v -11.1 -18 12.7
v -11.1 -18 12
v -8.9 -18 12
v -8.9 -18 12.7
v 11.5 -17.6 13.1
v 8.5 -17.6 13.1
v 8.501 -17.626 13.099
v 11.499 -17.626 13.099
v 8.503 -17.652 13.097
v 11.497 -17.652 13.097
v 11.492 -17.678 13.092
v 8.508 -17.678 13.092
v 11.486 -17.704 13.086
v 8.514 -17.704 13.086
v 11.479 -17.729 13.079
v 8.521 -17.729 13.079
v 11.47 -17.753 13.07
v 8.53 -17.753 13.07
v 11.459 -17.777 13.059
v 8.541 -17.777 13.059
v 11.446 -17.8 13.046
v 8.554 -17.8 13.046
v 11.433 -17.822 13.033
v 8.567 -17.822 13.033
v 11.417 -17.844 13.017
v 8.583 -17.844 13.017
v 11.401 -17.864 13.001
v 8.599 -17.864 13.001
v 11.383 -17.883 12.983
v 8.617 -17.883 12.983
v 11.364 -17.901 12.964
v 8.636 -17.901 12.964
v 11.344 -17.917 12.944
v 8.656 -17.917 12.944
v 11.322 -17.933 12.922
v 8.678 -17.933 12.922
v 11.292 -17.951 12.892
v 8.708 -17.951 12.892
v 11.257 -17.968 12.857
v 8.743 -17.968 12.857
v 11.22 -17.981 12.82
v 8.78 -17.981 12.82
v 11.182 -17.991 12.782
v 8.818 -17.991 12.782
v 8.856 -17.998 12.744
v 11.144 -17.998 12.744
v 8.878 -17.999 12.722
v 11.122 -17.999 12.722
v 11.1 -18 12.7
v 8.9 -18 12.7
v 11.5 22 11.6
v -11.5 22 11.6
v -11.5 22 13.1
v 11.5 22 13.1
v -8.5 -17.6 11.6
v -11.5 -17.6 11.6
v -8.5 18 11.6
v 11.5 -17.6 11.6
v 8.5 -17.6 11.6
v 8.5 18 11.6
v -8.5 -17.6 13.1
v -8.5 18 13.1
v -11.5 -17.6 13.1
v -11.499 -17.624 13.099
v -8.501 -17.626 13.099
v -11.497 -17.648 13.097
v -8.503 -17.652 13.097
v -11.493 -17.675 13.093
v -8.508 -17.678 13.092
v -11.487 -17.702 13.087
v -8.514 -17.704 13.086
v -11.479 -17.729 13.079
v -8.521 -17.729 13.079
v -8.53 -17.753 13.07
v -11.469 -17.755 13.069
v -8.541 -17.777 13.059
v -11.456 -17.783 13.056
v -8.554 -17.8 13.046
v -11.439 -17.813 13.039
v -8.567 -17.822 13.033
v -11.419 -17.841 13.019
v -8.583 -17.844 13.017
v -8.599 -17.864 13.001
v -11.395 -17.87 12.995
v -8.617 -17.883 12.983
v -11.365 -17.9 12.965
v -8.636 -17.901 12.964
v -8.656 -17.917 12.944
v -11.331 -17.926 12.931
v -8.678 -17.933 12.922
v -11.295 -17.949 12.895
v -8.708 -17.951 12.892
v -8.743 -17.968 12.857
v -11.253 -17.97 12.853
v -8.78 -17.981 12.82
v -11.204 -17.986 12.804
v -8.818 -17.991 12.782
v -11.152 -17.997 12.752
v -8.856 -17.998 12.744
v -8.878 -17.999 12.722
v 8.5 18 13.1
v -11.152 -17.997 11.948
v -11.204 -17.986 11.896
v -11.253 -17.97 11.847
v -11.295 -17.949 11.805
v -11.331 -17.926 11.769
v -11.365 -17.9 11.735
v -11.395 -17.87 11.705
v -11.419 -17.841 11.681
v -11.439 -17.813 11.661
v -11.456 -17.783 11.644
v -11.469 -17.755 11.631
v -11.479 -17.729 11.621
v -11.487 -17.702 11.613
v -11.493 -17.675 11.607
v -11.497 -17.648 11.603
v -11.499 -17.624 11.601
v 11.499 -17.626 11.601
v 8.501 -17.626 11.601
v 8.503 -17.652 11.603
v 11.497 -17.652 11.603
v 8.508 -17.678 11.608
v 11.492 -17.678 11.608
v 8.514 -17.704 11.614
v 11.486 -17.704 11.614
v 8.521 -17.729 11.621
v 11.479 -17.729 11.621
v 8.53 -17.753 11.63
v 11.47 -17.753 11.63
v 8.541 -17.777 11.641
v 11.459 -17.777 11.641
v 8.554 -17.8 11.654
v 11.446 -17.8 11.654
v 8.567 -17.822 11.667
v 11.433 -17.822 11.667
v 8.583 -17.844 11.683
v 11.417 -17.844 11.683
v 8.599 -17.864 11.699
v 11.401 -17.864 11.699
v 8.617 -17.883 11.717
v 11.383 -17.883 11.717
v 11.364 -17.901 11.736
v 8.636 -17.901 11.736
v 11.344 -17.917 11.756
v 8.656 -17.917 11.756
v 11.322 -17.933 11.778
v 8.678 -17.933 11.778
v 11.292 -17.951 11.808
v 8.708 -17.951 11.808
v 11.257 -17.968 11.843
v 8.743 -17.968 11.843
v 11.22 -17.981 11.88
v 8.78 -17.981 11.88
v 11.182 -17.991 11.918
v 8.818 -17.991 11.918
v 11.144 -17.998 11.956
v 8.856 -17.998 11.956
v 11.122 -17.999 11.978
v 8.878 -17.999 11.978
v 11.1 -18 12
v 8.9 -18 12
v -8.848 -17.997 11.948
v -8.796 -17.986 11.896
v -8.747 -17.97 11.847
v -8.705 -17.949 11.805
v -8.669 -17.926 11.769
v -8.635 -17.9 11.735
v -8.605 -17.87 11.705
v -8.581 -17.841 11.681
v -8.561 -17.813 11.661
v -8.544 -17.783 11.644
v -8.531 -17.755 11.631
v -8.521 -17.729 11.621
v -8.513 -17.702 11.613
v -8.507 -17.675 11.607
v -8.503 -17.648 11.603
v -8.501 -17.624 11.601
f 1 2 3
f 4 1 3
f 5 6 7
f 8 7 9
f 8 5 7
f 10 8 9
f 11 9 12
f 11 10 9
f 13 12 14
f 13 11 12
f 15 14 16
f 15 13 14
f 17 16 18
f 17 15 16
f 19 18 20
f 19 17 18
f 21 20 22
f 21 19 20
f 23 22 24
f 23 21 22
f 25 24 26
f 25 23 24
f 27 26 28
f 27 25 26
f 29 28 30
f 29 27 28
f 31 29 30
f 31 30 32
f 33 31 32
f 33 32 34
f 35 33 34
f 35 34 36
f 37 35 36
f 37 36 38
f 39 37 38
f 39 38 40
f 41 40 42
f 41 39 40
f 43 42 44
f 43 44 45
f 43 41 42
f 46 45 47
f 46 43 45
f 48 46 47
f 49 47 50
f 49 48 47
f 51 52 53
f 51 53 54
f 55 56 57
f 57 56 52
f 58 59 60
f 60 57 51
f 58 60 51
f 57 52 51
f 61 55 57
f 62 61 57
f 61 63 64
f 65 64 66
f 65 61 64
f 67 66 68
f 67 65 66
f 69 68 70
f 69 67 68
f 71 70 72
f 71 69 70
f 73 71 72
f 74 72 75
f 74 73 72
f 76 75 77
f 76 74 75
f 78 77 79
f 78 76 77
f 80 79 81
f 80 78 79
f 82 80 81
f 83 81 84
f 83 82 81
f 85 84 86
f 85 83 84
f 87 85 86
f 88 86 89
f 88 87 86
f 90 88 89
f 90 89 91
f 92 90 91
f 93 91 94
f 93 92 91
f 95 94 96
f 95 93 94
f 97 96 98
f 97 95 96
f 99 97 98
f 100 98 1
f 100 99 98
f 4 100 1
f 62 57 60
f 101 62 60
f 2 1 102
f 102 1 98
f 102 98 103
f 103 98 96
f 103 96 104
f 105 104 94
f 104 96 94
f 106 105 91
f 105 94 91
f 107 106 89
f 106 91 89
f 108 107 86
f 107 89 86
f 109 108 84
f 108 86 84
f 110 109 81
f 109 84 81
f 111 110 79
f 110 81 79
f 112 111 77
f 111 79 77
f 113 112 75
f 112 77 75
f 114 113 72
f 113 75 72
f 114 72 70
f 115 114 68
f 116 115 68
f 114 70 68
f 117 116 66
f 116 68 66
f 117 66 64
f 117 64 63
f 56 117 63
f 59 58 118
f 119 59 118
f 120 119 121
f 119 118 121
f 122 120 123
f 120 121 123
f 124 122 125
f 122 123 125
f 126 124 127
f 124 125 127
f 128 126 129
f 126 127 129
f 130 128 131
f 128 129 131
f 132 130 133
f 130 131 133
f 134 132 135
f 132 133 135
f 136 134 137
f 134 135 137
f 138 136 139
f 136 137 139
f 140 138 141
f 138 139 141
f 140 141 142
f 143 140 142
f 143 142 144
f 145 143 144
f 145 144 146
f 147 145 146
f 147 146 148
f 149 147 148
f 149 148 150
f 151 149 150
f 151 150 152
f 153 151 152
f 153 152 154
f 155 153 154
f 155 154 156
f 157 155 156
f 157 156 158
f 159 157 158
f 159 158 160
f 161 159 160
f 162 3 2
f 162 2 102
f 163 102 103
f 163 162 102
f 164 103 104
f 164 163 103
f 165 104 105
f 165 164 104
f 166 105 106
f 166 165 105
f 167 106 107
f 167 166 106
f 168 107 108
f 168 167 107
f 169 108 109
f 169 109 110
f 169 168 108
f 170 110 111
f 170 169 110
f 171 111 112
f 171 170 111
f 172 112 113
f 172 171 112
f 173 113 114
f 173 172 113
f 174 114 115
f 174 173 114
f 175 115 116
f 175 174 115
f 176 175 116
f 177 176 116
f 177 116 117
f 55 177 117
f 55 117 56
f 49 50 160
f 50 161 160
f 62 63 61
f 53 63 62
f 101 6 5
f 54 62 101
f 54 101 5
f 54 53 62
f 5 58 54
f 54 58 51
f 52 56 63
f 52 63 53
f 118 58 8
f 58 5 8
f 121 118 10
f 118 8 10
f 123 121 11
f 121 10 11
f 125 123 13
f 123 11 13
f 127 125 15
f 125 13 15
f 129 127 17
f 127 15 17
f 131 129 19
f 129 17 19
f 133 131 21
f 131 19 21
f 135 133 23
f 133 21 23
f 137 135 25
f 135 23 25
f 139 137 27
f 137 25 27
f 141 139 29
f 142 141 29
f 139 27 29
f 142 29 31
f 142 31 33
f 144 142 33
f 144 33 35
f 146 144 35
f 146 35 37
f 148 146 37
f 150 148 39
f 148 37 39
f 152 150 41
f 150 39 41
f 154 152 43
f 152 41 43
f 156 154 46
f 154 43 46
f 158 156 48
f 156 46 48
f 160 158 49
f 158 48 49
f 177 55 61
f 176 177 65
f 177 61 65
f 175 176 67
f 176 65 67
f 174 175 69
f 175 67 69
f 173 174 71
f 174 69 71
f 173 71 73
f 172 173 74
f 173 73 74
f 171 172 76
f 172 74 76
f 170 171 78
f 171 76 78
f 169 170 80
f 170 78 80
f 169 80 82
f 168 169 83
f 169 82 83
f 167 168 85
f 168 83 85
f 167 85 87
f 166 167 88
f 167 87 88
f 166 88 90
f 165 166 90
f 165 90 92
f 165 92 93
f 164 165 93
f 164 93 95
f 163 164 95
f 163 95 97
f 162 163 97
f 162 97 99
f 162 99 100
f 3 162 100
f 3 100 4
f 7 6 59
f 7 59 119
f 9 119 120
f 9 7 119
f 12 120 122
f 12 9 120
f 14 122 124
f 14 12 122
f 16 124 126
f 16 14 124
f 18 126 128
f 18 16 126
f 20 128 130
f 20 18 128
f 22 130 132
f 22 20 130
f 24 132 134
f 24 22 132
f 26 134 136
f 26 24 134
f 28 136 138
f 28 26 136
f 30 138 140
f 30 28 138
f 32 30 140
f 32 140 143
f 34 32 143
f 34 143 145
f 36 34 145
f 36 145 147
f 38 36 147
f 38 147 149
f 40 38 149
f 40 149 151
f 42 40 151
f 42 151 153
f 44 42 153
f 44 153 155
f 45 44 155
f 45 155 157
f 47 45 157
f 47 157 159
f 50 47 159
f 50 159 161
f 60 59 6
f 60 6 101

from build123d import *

# Parameters (mm, degrees)
BOX002_W     = 23
BOX002_H     = 4
BOX002_DEPTH = 1.5
BOX001_W     = 3
BOX001_H     = 36
BOX001_DEPTH = 1.5
BOX_W        = 3
BOX_H        = 36
BOX_DEPTH    = 1.5
FILLET006_R  = 0.4


with BuildPart() as cube002:
    # Box002 → Box002 (new body)
    with BuildSketch(Plane(origin=(-11.5, 18, 11.6), x_dir=(1, 0, 0), z_dir=(0, 0, 1))):
        with Locations((11.5, 2)):
            Rectangle(BOX002_W, BOX002_H)
    extrude(amount=BOX002_DEPTH)


with BuildPart() as cube001:
    # Box001 → Box001 (new body)
    with BuildSketch(Plane(origin=(8.5, -18, 11.6), x_dir=(1, 0, 0), z_dir=(0, 0, 1))):
        with Locations((1.5, 18)):
            Rectangle(BOX001_W, BOX001_H)
    extrude(amount=BOX001_DEPTH)


with BuildPart() as fillet006:
    # Box → Box (new body)
    with BuildSketch(Plane(origin=(-11.5, -18, 11.6), x_dir=(1, 0, 0), z_dir=(0, 0, 1))):
        with Locations((1.5, 18)):
            Rectangle(BOX_W, BOX_H)
    extrude(amount=BOX_DEPTH)

    # Fusion002: union Cube002, Cube001
    add(cube002.part)
    add(cube001.part)

    # Fillet006
    fillet006_edges = [fillet006.edges().sort_by_distance(p)[0] for p in [
        (-11.5, -18, 12.35),
        (-10, -18, 11.6),
        (-8.5, -18, 12.35),
        (-10, -18, 13.1),
        (10, -18, 13.1),
        (10, -18, 11.6),
        (8.5, -18, 12.35),
        (11.5, -18, 12.35),
    ]]
    fillet(fillet006_edges, radius=FILLET006_R)


solid = fillet006.part
